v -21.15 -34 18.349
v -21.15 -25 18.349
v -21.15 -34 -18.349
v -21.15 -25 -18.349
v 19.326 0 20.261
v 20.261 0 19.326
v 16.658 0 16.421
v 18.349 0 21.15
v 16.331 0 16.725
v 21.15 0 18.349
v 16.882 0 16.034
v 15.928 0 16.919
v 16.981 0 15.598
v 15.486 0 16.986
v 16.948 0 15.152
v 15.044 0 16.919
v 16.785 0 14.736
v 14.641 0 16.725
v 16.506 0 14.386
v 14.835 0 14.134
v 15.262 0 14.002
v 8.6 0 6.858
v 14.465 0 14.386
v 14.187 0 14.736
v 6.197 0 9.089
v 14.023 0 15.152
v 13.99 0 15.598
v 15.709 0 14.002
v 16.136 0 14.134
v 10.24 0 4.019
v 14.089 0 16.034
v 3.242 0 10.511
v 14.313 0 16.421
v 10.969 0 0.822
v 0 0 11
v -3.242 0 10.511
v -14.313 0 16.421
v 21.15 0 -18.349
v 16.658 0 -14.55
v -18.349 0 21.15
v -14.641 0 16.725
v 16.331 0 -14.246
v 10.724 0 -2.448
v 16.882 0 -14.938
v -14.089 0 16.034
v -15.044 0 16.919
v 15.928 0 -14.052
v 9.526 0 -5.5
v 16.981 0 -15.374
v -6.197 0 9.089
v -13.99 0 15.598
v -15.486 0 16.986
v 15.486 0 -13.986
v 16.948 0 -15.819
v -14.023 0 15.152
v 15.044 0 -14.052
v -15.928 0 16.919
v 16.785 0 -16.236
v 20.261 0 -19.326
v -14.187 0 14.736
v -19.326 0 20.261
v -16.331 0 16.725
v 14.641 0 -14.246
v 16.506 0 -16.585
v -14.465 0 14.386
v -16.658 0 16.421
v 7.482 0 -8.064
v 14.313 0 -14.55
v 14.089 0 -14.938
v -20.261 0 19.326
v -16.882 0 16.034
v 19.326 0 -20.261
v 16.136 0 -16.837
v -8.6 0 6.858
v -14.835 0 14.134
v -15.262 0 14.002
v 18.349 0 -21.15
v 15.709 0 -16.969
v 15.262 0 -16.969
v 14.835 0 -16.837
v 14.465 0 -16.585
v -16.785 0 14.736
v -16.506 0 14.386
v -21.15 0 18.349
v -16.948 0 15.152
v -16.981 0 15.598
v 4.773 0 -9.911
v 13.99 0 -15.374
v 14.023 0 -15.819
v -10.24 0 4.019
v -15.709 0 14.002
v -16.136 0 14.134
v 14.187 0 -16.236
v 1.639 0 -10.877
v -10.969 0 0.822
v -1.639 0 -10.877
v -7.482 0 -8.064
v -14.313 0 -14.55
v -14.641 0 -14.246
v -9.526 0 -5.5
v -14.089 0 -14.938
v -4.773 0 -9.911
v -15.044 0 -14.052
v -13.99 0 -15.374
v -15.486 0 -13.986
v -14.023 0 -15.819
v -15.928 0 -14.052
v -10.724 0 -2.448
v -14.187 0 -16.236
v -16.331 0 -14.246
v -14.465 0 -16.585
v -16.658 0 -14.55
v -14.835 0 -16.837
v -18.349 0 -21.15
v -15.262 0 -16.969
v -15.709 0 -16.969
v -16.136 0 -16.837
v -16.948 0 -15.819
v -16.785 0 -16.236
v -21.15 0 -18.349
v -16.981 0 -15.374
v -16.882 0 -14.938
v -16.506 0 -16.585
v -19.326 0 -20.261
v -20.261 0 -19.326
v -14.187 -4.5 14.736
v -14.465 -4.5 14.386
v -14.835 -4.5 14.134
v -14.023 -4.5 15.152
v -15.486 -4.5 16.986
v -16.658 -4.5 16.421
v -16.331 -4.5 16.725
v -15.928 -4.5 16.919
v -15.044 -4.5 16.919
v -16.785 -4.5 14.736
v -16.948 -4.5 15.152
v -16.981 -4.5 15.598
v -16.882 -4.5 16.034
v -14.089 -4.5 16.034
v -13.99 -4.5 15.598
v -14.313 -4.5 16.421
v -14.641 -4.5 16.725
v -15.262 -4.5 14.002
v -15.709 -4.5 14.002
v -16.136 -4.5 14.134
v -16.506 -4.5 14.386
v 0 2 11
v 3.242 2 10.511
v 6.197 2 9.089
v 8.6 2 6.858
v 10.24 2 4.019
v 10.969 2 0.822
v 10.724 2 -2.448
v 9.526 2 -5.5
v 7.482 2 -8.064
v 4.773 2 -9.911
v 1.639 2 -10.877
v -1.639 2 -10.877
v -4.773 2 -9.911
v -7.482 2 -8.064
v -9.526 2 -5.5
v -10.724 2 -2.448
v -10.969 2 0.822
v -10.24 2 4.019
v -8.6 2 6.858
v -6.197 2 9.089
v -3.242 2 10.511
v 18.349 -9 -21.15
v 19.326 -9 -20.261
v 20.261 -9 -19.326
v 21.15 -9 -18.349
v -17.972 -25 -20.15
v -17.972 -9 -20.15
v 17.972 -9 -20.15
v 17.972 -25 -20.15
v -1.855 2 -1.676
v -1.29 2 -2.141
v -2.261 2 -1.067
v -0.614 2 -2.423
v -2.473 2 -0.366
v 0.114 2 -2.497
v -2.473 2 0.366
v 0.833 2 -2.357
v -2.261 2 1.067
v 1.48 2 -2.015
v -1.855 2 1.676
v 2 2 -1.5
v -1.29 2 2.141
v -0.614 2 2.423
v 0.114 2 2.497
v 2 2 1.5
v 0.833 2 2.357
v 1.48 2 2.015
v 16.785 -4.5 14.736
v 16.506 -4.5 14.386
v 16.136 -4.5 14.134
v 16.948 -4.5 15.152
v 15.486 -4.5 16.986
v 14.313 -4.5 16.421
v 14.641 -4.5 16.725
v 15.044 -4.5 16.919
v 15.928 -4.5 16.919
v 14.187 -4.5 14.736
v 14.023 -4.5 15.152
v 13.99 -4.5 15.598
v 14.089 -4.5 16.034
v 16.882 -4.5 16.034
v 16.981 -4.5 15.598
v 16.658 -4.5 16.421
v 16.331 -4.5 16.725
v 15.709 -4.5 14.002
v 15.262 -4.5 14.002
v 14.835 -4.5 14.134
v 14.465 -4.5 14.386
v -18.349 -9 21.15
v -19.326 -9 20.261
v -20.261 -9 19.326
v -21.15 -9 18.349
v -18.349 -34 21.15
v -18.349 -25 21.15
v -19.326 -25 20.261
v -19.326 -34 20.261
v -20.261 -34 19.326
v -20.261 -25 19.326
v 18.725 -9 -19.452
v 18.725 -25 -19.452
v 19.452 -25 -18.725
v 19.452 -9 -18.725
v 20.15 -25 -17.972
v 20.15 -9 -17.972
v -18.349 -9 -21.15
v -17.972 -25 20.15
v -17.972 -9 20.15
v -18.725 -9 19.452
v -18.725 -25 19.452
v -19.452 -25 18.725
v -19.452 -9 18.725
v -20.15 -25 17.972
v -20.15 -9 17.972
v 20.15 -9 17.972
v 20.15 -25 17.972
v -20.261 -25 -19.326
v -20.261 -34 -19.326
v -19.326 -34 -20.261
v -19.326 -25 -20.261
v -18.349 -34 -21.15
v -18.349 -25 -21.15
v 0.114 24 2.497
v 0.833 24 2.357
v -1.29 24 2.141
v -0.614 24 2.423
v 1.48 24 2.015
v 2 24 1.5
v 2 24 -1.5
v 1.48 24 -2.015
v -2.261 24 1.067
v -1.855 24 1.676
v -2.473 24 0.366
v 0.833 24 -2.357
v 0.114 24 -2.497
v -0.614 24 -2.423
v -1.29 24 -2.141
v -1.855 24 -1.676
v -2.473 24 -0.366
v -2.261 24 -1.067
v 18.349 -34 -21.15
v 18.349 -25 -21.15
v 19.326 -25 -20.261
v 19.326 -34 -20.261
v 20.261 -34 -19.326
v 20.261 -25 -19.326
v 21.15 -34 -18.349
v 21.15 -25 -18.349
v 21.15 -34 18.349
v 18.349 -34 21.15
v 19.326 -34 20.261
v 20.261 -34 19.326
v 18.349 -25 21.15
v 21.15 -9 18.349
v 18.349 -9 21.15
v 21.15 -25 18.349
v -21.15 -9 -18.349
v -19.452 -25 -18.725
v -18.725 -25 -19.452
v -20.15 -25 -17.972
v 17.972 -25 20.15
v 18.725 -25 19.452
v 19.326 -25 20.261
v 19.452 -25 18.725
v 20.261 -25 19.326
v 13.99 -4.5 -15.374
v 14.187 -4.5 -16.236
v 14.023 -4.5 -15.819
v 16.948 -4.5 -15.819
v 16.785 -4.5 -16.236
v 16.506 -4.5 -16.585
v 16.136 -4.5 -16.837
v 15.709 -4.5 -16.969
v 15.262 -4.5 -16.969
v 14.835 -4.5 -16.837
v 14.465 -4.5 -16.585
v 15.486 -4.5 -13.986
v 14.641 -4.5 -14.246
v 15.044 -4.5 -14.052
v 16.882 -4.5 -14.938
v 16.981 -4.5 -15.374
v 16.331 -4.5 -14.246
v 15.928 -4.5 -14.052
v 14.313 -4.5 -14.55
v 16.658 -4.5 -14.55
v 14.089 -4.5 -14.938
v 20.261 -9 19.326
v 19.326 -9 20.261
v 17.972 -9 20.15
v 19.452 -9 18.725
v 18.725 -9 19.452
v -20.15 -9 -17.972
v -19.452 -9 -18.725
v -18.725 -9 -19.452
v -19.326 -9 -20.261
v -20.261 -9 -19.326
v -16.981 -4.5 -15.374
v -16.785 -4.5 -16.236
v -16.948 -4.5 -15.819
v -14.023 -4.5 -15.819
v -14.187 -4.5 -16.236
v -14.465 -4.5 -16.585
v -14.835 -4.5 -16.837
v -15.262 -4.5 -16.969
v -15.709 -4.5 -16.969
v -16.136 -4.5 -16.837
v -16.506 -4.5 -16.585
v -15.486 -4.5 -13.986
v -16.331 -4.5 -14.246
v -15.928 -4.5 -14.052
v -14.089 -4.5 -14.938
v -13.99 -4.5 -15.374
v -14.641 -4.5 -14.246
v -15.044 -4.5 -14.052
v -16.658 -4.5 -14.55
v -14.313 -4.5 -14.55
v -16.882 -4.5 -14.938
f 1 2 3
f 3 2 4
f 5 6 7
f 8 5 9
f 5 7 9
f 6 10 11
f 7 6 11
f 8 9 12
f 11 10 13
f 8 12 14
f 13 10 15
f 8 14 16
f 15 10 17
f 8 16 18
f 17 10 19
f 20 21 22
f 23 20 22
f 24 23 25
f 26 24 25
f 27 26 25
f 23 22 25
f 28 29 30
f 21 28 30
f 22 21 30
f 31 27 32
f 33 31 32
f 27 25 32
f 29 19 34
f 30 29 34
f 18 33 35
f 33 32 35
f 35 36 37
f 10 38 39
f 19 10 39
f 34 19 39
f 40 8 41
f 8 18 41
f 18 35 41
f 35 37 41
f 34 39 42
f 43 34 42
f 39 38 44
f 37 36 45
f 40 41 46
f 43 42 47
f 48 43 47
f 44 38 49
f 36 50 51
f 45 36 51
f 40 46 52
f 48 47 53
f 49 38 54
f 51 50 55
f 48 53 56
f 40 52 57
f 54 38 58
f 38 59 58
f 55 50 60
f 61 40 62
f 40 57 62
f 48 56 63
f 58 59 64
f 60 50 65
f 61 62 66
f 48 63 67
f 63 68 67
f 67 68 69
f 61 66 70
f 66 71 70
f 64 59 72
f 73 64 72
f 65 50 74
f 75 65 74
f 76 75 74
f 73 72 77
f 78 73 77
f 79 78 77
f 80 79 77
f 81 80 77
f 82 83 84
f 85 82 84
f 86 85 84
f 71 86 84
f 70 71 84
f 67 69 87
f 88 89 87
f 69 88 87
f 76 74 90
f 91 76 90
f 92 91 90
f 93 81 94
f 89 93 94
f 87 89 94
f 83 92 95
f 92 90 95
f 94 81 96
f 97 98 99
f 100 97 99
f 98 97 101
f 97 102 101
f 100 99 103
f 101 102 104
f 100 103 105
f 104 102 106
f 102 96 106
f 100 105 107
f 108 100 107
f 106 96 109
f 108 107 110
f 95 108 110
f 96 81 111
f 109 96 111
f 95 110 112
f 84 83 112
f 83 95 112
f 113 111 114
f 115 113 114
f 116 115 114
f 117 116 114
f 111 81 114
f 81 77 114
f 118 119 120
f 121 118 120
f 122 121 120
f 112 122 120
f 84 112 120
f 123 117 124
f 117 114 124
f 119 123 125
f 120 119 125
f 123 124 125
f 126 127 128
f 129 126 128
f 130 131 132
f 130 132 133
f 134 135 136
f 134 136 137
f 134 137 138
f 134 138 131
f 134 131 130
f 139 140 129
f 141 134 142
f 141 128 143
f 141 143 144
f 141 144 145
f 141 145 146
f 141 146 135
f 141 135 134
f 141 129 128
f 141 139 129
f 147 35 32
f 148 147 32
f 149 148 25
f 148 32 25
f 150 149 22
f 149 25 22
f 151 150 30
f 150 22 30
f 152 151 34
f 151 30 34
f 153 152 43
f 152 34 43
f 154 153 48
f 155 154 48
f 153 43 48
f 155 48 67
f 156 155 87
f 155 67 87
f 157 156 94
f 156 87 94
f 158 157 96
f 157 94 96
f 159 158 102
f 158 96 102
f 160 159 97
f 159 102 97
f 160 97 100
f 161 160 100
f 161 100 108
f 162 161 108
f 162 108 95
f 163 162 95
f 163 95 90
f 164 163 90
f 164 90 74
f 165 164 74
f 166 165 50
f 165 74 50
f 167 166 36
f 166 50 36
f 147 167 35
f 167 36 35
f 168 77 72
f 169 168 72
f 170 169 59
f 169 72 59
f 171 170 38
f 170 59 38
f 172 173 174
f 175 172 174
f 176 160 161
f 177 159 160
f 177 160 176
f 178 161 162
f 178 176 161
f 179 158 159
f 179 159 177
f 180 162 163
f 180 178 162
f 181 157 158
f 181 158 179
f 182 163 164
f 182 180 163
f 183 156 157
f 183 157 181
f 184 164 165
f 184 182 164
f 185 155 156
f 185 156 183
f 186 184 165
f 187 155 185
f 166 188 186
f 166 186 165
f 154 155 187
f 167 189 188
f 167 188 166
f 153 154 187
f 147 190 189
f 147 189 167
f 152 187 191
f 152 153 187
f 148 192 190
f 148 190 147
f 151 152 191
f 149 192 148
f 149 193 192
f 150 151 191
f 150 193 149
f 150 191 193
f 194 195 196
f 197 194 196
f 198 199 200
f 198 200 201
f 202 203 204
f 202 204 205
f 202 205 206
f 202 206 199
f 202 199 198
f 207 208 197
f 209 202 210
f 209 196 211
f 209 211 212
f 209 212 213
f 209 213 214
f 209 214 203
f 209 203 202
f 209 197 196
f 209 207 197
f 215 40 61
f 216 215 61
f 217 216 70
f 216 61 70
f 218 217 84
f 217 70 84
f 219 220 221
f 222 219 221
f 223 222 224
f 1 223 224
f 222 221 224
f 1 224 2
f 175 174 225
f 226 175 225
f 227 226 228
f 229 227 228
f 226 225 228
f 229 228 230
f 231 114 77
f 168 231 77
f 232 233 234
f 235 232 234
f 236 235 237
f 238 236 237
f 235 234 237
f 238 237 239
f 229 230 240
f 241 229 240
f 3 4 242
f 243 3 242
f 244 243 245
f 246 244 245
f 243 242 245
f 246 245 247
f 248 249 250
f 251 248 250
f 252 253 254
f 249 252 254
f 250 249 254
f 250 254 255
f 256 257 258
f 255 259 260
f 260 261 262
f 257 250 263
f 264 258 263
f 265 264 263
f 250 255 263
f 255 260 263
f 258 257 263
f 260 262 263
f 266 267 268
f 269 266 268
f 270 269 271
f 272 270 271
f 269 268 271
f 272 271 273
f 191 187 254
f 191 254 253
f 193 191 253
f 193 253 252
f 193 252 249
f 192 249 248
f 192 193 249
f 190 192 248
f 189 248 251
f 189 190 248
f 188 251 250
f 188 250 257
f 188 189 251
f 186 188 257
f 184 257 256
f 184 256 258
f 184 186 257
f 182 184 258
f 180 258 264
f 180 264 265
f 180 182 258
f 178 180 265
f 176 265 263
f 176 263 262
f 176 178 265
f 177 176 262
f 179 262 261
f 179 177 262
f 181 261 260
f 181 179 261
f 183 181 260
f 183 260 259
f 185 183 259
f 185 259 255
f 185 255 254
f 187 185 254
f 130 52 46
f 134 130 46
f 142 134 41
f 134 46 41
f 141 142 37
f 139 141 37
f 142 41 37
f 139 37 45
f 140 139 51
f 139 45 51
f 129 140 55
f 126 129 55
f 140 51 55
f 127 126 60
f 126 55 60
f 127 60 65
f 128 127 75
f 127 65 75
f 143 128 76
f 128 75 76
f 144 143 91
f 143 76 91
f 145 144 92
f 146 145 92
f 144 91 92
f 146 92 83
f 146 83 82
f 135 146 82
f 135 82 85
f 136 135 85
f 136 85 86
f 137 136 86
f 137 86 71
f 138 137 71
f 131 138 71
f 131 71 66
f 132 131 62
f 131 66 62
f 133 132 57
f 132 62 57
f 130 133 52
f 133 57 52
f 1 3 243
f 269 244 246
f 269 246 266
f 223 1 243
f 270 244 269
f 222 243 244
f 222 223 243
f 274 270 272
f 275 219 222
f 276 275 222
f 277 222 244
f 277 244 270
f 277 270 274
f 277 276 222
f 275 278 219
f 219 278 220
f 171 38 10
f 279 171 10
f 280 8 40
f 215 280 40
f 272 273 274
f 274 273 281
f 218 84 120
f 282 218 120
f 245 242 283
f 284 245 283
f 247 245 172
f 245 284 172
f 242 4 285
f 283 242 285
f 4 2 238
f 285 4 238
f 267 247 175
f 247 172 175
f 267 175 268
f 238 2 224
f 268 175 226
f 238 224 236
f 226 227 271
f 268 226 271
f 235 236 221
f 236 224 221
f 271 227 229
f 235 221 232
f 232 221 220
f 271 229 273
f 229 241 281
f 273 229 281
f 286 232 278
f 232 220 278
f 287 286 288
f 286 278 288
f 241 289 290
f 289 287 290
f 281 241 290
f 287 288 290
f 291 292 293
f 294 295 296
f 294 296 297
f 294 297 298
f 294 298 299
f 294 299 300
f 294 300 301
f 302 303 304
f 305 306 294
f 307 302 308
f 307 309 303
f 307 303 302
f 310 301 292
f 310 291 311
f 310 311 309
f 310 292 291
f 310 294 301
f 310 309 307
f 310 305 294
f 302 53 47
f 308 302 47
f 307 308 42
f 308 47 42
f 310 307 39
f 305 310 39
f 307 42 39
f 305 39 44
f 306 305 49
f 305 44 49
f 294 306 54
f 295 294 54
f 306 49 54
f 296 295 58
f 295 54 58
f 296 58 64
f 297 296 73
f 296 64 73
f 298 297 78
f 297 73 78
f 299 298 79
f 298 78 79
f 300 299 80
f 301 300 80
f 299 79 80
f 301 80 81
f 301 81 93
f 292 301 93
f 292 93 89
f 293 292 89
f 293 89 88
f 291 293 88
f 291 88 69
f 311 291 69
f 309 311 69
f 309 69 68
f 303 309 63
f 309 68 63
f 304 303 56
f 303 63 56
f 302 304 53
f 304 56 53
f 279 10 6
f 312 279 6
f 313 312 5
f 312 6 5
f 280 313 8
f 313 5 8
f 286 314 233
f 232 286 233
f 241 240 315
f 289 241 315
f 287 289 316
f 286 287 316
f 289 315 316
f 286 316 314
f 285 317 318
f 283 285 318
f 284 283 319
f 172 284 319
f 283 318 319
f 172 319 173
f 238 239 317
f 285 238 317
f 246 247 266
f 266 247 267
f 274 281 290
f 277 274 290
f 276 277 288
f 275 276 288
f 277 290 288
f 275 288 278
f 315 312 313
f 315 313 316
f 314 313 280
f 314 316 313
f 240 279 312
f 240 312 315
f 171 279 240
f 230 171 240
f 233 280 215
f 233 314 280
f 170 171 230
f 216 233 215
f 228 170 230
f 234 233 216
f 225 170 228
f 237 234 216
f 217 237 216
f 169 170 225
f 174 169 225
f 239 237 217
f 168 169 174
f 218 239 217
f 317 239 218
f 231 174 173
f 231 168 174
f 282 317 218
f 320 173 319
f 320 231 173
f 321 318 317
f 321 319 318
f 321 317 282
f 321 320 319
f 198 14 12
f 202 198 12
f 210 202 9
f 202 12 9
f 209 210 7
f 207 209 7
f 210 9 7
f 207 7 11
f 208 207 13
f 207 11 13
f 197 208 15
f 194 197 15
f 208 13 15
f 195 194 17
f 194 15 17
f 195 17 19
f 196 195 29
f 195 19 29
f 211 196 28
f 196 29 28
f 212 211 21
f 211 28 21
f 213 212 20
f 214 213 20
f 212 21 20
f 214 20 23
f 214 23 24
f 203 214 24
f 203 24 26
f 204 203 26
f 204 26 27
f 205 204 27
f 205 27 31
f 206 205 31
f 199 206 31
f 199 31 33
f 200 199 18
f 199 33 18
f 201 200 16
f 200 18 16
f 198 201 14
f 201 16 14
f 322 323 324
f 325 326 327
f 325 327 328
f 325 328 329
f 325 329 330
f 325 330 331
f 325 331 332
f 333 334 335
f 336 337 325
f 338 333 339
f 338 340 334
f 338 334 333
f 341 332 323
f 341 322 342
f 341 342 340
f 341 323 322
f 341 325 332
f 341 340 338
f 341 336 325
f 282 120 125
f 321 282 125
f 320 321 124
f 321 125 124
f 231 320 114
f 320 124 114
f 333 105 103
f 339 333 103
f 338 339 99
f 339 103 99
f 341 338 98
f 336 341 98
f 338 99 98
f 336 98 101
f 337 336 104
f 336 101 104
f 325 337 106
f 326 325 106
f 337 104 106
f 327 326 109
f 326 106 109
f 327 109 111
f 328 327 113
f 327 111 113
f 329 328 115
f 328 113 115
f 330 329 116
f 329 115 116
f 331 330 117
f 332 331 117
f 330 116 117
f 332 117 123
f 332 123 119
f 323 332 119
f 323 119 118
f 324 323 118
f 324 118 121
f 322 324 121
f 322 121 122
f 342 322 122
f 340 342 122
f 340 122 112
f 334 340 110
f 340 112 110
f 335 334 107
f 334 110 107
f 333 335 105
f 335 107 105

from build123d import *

# Parameters (mm, degrees)
BOSS_EXTRUDE1_DEPTH = 24
SKETCH2_R           = 11
BOSS_EXTRUDE2_DEPTH = 2
BOSS_EXTRUDE3_DEPTH = 9
BOSS_EXTRUDE4_DEPTH = 16
BOSS_EXTRUDE5_DEPTH = 9
SKETCH6_R           = 1.5
CUT_EXTRUDE1_DEPTH  = 4.5


with BuildPart() as part:
    # Sketch1 → Boss-Extrude1 (new body)
    with BuildSketch(Plane(origin=(0, 0, 0), x_dir=(1, 0, 0), z_dir=(0, 1, 0))):
        with BuildLine():
            Line((2, 1.5), (2, -1.5))
            ThreePointArc((2, -1.5), (-2.5, 0), (2, 1.5))
        make_face()
    extrude(amount=BOSS_EXTRUDE1_DEPTH)

    # Sketch2 → Boss-Extrude2 (add)
    with BuildSketch(Plane(origin=(0, 0, 0), x_dir=(1, 0, 0), z_dir=(0, 1, 0))):
        with Locations(Location((0, 0, 0), (0, 0, 270))):
            Circle(SKETCH2_R)
    extrude(amount=BOSS_EXTRUDE2_DEPTH)

    # Sketch3 → Boss-Extrude3 (add)
    with BuildSketch(Plane(origin=(0, 0, 0), x_dir=(1, 0, 0), z_dir=(0, 1, 0))):
        with BuildLine():
            Line((-18.348773801, 21.15), (18.348773801, 21.15))
            ThreePointArc((18.348773801, 21.15), (19.798989873, 19.798989873), (21.15, 18.348773801))
            Line((21.15, 18.348773801), (21.15, -18.348773801))
            ThreePointArc((21.15, -18.348773801), (19.798989873, -19.798989873), (18.348773801, -21.15))
            Line((18.348773801, -21.15), (-18.348773801, -21.15))
            ThreePointArc((-18.348773801, -21.15), (-19.798989873, -19.798989873), (-21.15, -18.348773801))
            Line((-21.15, -18.348773801), (-21.15, 18.348773801))
            ThreePointArc((-21.15, 18.348773801), (-19.798989873, 19.798989873), (-18.348773801, 21.15))
        make_face()
    extrude(amount=-BOSS_EXTRUDE3_DEPTH)

    # Sketch4 → Boss-Extrude4 (add)
    with BuildSketch(Plane.XZ.offset(9)):
        with BuildLine():
            Line((20.15, -17.971574778), (20.15, 17.971574778))
            ThreePointArc((20.15, 17.971574778), (19.091883092, 19.091883092), (17.971574778, 20.15))
            Line((17.971574778, 20.15), (-17.971574778, 20.15))
            ThreePointArc((-17.971574778, 20.15), (-19.091883092, 19.091883092), (-20.15, 17.971574778))
            Line((-20.15, 17.971574778), (-20.15, -17.971574778))
            ThreePointArc((-20.15, -17.971574778), (-19.091883092, -19.091883092), (-17.971574778, -20.15))
            Line((-17.971574778, -20.15), (17.971574778, -20.15))
            ThreePointArc((17.971574778, -20.15), (19.091883092, -19.091883092), (20.15, -17.971574778))
        make_face()
    extrude(amount=BOSS_EXTRUDE4_DEPTH)

    # Sketch5 → Boss-Extrude5 (add)
    with BuildSketch(Plane.XZ.offset(25)):
        with BuildLine():
            Line((21.15, -18.348773801), (21.15, 18.348773801))
            ThreePointArc((21.15, 18.348773801), (19.798989873, 19.798989873), (18.348773801, 21.15))
            Line((18.348773801, 21.15), (-18.348773801, 21.15))
            ThreePointArc((-18.348773801, 21.15), (-19.798989873, 19.798989873), (-21.15, 18.348773801))
            Line((-21.15, 18.348773801), (-21.15, -18.348773801))
            ThreePointArc((-21.15, -18.348773801), (-19.798989873, -19.798989873), (-18.348773801, -21.15))
            Line((-18.348773801, -21.15), (18.348773801, -21.15))
            ThreePointArc((18.348773801, -21.15), (19.798989873, -19.798989873), (21.15, -18.348773801))
        make_face()
    extrude(amount=BOSS_EXTRUDE5_DEPTH)

    # Sketch6 → Cut-Extrude1 (cut)
    with BuildSketch(Plane(origin=(0, 0, 0), x_dir=(1, 0, 0), z_dir=(0, 1, 0))):
        with Locations(Location((-15.485638508, 15.485638508, 0), (0, 0, 270))):
            Circle(SKETCH6_R)
        with Locations(Location((15.485638508, 15.485638508, 0), (0, 0, 270))):
            Circle(SKETCH6_R)
        with Locations(Location((15.485638508, -15.485638508, 0), (0, 0, 270))):
            Circle(SKETCH6_R)
        with Locations(Location((-15.485638508, -15.485638508, 0), (0, 0, 270))):
            Circle(SKETCH6_R)
    extrude(amount=-CUT_EXTRUDE1_DEPTH, mode=Mode.SUBTRACT)


solid = part.part
